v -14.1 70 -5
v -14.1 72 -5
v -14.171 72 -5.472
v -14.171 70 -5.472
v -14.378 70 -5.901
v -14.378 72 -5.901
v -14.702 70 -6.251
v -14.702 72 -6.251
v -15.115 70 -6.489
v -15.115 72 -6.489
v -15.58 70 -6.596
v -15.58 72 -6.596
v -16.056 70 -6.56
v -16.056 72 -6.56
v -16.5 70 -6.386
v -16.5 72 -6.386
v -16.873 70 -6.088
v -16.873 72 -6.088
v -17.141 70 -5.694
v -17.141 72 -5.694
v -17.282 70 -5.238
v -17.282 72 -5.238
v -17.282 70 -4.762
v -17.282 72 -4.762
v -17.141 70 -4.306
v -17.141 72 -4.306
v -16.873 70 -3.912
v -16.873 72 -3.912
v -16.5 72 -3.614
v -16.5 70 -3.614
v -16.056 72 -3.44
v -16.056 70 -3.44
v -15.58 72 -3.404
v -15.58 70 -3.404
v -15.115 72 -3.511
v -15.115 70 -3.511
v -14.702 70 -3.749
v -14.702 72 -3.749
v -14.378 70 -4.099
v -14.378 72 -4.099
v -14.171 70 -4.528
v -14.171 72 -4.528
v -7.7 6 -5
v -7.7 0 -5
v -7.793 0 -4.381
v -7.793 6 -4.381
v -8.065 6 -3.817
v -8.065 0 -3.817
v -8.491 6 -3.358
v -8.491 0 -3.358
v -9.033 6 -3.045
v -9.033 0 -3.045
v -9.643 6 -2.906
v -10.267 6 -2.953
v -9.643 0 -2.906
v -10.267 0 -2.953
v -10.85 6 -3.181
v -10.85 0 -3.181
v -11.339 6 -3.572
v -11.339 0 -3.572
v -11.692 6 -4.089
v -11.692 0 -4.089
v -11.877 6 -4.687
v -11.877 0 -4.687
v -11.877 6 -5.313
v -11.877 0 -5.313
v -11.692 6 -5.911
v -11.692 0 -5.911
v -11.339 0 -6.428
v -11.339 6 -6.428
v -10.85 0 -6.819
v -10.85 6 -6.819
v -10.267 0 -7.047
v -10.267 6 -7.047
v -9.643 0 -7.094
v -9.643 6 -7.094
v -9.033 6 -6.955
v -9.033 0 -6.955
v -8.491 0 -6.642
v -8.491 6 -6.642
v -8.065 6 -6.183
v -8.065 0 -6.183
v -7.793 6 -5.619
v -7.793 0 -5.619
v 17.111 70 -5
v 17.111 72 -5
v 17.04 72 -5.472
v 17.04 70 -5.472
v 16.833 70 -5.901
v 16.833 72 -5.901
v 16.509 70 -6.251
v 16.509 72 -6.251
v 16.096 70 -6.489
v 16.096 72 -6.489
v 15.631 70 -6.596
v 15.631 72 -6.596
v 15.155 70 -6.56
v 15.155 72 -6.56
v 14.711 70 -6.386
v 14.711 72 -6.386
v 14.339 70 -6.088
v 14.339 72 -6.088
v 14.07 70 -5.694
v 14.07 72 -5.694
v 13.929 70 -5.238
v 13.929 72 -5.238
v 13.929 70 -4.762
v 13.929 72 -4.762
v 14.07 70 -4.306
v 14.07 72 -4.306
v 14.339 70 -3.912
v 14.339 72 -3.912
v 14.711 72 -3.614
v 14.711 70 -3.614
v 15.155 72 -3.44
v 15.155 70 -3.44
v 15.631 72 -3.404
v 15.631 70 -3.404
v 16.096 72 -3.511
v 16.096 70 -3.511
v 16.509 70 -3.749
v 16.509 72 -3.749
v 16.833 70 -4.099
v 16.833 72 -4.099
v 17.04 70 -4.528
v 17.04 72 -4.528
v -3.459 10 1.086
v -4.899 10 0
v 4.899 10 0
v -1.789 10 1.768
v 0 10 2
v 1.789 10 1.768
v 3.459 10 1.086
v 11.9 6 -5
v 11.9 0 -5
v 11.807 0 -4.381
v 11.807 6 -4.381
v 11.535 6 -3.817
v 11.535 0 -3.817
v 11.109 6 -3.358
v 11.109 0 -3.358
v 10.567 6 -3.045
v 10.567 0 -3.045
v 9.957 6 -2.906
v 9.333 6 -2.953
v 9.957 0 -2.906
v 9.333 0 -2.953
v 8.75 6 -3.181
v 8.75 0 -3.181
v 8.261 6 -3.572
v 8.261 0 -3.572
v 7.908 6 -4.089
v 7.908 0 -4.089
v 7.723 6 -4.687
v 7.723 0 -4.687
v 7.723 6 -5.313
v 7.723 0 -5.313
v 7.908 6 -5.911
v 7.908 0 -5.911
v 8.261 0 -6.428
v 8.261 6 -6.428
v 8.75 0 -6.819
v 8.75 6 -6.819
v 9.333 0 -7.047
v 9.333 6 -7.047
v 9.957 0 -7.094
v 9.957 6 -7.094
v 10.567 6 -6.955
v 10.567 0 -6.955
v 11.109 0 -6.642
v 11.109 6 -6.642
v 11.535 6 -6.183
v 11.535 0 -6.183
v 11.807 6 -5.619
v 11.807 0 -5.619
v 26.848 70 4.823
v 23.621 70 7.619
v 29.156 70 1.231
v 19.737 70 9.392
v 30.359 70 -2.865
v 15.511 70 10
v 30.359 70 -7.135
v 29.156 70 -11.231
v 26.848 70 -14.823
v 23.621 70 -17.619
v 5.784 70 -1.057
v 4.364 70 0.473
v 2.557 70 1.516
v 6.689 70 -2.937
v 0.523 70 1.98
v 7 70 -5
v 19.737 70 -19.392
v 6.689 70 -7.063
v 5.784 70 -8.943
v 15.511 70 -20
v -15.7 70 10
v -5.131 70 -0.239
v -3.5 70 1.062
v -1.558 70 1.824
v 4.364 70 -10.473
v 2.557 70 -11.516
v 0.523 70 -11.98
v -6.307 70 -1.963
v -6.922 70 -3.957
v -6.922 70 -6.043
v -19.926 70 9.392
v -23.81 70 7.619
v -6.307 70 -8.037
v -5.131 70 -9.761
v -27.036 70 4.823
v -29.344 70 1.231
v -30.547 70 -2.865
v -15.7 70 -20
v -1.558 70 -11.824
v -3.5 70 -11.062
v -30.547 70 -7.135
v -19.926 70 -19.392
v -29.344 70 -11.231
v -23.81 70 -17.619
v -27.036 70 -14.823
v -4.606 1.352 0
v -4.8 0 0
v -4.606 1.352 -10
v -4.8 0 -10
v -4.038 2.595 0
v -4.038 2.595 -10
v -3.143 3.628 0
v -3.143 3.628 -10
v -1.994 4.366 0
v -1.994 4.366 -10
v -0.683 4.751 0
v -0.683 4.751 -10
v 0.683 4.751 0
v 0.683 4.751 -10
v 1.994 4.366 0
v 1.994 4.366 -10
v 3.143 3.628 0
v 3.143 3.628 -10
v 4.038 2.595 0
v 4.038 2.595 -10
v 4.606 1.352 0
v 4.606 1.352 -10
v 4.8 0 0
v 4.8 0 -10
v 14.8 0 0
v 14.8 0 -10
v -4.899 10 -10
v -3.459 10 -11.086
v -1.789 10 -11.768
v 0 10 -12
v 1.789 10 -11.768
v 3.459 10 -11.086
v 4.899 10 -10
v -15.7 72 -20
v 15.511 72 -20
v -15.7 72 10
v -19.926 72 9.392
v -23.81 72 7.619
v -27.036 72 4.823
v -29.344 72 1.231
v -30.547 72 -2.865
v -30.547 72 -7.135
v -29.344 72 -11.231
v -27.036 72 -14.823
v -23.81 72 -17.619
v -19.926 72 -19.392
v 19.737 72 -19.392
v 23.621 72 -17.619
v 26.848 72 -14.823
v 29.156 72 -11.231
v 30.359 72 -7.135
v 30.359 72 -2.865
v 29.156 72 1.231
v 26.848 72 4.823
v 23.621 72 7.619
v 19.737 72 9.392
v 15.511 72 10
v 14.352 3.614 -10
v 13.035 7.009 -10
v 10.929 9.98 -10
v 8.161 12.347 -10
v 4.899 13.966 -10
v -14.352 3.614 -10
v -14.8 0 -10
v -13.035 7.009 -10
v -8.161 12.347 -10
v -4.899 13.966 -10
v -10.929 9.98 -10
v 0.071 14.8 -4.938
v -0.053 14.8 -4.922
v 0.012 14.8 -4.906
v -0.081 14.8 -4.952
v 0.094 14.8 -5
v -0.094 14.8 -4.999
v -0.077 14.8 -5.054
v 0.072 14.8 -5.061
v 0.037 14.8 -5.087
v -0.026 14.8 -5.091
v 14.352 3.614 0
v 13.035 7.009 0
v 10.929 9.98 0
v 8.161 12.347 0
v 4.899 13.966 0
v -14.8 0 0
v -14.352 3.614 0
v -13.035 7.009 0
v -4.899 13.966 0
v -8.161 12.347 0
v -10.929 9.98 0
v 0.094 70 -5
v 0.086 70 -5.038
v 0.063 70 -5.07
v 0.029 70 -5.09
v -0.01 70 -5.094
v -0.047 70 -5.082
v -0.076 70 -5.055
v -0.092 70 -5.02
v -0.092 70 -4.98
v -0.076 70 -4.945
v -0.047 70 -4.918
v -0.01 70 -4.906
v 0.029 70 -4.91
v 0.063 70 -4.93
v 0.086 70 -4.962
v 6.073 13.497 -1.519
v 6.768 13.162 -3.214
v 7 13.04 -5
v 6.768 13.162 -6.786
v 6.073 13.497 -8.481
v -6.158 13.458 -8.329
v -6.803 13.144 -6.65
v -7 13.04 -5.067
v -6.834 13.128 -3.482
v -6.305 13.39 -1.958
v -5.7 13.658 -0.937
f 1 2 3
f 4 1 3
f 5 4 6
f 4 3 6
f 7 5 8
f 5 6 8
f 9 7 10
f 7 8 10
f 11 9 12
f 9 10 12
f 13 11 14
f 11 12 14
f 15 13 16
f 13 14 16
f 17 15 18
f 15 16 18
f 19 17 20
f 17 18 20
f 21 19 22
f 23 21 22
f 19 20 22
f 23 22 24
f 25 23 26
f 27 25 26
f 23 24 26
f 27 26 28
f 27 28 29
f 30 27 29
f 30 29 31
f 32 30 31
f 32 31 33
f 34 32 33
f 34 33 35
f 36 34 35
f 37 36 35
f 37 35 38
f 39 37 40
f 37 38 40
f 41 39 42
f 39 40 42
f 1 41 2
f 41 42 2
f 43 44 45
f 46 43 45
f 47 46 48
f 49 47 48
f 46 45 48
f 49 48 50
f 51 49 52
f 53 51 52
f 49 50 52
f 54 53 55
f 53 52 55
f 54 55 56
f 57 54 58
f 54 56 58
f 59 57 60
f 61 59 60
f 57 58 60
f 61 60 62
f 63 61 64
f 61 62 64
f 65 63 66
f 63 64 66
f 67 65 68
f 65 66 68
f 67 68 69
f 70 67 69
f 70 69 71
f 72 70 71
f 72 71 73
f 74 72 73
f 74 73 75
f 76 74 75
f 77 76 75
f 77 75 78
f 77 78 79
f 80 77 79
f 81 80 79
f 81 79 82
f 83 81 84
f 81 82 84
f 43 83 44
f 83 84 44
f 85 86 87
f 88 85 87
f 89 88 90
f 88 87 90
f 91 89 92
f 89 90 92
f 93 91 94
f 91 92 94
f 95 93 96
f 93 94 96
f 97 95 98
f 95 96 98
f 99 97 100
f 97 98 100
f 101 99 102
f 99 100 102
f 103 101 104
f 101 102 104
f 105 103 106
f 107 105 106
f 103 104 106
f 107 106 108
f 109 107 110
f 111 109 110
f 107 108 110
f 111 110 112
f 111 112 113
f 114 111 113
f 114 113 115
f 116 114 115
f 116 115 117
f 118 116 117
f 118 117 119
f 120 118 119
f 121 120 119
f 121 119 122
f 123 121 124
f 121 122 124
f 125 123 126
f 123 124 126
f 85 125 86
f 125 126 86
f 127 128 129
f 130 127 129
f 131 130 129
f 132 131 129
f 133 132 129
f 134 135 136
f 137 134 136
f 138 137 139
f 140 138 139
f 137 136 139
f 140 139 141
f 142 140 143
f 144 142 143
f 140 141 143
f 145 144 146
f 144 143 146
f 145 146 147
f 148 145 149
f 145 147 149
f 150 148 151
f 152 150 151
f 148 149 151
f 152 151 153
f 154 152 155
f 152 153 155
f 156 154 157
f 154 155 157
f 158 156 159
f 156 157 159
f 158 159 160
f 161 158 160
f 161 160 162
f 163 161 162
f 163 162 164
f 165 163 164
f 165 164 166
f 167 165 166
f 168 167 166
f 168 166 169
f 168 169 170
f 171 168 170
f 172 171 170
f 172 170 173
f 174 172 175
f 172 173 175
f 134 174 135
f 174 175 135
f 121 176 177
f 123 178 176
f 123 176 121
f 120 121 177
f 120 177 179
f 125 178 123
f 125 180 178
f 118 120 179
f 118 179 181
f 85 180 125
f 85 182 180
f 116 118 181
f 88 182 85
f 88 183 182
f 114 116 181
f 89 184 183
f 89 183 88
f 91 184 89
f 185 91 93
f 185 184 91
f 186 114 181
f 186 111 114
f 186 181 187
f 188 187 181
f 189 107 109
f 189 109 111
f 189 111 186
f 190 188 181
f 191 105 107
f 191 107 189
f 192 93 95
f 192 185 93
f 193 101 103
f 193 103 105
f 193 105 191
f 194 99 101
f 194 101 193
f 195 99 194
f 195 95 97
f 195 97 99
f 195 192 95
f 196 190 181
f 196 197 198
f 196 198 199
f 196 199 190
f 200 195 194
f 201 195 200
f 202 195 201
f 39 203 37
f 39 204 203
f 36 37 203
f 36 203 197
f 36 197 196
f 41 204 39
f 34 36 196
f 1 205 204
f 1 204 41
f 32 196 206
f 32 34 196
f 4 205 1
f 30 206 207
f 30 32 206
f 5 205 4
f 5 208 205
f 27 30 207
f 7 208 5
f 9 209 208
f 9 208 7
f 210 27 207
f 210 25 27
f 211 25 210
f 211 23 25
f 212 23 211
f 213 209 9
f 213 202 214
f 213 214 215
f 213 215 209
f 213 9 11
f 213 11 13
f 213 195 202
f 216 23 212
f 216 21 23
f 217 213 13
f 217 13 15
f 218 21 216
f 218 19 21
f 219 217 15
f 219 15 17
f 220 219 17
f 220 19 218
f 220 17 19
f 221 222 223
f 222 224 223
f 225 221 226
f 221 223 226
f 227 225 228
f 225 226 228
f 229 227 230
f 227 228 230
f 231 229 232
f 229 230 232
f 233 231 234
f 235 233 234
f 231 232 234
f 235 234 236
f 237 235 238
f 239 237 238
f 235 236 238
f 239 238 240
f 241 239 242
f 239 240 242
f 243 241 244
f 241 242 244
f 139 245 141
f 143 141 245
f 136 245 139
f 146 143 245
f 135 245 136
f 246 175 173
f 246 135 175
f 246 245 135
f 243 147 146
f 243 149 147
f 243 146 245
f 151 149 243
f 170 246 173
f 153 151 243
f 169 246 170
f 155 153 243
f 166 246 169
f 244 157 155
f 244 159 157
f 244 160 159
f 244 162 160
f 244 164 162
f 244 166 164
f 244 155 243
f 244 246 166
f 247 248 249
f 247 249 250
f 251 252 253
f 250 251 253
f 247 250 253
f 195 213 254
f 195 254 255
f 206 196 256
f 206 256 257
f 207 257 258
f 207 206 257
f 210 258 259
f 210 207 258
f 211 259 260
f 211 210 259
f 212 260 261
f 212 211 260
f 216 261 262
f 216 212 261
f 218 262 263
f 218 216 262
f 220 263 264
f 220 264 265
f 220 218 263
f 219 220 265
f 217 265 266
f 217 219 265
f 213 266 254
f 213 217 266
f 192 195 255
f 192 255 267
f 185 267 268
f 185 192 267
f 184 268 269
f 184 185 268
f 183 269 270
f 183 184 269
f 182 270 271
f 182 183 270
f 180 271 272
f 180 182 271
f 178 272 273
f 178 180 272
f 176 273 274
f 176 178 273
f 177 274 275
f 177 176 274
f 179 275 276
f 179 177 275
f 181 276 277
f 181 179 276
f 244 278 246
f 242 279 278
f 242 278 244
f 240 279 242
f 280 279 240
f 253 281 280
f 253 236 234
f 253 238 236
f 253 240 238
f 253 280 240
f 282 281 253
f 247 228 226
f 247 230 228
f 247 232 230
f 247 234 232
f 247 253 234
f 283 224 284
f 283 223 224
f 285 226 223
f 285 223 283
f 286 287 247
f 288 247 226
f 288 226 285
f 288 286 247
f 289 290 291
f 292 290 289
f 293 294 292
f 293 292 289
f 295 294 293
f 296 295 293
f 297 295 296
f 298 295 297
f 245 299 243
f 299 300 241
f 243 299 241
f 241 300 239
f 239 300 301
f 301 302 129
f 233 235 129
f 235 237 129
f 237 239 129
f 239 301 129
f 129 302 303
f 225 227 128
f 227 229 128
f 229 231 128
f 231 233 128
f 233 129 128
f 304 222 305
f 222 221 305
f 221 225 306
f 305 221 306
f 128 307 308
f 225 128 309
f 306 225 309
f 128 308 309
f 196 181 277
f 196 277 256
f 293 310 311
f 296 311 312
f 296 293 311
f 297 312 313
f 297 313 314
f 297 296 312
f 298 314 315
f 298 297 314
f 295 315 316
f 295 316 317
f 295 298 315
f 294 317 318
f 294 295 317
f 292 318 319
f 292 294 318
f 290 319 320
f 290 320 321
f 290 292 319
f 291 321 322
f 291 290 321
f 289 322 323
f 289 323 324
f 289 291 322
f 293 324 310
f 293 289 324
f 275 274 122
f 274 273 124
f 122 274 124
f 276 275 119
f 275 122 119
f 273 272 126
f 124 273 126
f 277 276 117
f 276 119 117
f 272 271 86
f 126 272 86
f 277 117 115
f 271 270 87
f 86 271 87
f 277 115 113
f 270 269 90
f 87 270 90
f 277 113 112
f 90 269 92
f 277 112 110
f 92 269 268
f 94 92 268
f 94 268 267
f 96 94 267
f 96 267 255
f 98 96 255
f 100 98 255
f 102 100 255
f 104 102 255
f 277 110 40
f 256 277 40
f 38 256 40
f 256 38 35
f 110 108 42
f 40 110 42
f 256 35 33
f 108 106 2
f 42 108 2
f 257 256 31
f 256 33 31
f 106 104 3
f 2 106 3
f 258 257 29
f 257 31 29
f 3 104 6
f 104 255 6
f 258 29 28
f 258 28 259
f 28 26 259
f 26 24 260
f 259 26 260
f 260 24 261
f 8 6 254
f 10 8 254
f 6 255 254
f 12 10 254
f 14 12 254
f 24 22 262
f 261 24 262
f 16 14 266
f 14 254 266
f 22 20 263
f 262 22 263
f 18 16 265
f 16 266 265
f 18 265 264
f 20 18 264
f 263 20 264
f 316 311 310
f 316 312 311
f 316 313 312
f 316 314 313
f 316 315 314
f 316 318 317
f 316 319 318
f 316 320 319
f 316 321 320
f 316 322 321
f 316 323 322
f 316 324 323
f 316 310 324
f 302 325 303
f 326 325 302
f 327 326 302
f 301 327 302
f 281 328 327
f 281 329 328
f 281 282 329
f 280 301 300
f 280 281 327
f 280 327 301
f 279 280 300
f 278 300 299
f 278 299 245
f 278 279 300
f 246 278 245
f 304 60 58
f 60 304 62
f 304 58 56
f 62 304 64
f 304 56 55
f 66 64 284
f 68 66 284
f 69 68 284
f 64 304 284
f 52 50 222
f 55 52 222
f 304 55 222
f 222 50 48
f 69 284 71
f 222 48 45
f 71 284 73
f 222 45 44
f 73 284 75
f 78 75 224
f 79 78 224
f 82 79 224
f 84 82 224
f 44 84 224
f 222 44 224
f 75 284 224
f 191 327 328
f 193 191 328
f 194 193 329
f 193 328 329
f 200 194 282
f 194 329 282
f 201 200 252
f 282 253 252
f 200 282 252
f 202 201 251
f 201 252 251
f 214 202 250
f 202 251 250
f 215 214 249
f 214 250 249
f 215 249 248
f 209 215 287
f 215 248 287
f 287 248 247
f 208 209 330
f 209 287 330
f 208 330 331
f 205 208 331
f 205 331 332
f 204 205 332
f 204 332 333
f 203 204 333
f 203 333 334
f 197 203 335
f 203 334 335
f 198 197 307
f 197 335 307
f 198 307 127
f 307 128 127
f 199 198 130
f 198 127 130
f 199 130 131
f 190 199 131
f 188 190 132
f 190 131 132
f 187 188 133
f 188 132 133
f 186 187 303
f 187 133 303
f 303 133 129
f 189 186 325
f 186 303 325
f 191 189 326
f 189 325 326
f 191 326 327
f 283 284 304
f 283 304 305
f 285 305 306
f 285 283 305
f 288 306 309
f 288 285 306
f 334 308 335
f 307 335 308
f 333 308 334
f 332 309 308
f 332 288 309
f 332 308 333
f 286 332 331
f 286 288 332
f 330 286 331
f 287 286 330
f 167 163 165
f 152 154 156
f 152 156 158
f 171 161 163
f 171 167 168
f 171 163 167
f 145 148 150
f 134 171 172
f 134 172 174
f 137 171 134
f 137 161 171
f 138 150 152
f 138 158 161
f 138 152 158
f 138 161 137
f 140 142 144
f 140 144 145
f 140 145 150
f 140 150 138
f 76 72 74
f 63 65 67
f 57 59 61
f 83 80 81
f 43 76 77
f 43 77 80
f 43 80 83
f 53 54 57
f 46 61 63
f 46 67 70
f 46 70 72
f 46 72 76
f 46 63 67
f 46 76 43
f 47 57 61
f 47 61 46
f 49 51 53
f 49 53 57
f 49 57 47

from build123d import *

# Parameters (mm, degrees)
SKETCH1_W           = 10
SKETCH1_H           = 10
REVOLVE1_ANGLE      = 180
BOSS_EXTRUDE1_START = 10
SKETCH3_R           = 7
SKETCH3_R_2         = 0.094269149
BOSS_EXTRUDE1_DEPTH = 60
SKETCH5_R           = 2.1
CUT_EXTRUDE1_DEPTH  = 6
SKETCH6_R           = 2.1
CUT_EXTRUDE2_DEPTH  = 6
BOSS_EXTRUDE3_DEPTH = 2
SKETCH14_R          = 1.6
CUT_EXTRUDE5_DEPTH  = 2


with BuildPart() as part:
    # Sketch1 → Revolve1 (revolve)
    with BuildSketch(Plane(origin=(0, 0, 0), x_dir=(1, 0, 0), z_dir=(0, 1, 0))):
        with Locations((-9.8, 5)):
            Rectangle(SKETCH1_W, SKETCH1_H)
    revolve(axis=Axis((0, 0, 3.39750235), (0, 0, -1)), revolution_arc=REVOLVE1_ANGLE)

    # Sketch3 → Boss-Extrude1 (add)
    with BuildSketch(Plane(origin=(0, 0, 0), x_dir=(1, 0, 0), z_dir=(0, 1, 0)).offset(BOSS_EXTRUDE1_START)):
        with Locations((0, 5)):
            Circle(SKETCH3_R)
        with Locations((0, 5)):
            Circle(SKETCH3_R_2, mode=Mode.SUBTRACT)
    extrude(amount=BOSS_EXTRUDE1_DEPTH)

    # Sketch5 → Cut-Extrude1 (cut)
    with BuildSketch(Plane.XZ):
        with Locations((9.8, -5)):
            Circle(SKETCH5_R)
    extrude(amount=-CUT_EXTRUDE1_DEPTH, mode=Mode.SUBTRACT)

    # Sketch6 → Cut-Extrude2 (cut)
    with BuildSketch(Plane.XZ):
        with Locations((-9.8, -5)):
            Circle(SKETCH6_R)
    extrude(amount=-CUT_EXTRUDE2_DEPTH, mode=Mode.SUBTRACT)

    # Sketch11 → Boss-Extrude3 (add)
    with BuildSketch(Plane(origin=(0, 70, 0), x_dir=(1, 0, 0), z_dir=(0, 1, 0))):
        with BuildLine():
            Line((-15.699935159, 20), (15.51139686, 20))
            ThreePointArc((15.51139686, 20), (30.51139686, 5), (15.51139686, -10))
            Line((15.51139686, -10), (-15.699935159, -10))
            ThreePointArc((-15.699935159, -10), (-30.699935159, 5), (-15.699935159, 20))
        make_face()
    extrude(amount=BOSS_EXTRUDE3_DEPTH)

    # Sketch14 → Cut-Extrude5 (cut)
    with BuildSketch(Plane(origin=(0, 72, 0), x_dir=(1, 0, 0), z_dir=(0, 1, 0))):
        with Locations((-15.699935159, 5)):
            Circle(SKETCH14_R)
        with Locations((15.51139686, 5)):
            Circle(SKETCH14_R)
    extrude(amount=-CUT_EXTRUDE5_DEPTH, mode=Mode.SUBTRACT)


solid = part.part
